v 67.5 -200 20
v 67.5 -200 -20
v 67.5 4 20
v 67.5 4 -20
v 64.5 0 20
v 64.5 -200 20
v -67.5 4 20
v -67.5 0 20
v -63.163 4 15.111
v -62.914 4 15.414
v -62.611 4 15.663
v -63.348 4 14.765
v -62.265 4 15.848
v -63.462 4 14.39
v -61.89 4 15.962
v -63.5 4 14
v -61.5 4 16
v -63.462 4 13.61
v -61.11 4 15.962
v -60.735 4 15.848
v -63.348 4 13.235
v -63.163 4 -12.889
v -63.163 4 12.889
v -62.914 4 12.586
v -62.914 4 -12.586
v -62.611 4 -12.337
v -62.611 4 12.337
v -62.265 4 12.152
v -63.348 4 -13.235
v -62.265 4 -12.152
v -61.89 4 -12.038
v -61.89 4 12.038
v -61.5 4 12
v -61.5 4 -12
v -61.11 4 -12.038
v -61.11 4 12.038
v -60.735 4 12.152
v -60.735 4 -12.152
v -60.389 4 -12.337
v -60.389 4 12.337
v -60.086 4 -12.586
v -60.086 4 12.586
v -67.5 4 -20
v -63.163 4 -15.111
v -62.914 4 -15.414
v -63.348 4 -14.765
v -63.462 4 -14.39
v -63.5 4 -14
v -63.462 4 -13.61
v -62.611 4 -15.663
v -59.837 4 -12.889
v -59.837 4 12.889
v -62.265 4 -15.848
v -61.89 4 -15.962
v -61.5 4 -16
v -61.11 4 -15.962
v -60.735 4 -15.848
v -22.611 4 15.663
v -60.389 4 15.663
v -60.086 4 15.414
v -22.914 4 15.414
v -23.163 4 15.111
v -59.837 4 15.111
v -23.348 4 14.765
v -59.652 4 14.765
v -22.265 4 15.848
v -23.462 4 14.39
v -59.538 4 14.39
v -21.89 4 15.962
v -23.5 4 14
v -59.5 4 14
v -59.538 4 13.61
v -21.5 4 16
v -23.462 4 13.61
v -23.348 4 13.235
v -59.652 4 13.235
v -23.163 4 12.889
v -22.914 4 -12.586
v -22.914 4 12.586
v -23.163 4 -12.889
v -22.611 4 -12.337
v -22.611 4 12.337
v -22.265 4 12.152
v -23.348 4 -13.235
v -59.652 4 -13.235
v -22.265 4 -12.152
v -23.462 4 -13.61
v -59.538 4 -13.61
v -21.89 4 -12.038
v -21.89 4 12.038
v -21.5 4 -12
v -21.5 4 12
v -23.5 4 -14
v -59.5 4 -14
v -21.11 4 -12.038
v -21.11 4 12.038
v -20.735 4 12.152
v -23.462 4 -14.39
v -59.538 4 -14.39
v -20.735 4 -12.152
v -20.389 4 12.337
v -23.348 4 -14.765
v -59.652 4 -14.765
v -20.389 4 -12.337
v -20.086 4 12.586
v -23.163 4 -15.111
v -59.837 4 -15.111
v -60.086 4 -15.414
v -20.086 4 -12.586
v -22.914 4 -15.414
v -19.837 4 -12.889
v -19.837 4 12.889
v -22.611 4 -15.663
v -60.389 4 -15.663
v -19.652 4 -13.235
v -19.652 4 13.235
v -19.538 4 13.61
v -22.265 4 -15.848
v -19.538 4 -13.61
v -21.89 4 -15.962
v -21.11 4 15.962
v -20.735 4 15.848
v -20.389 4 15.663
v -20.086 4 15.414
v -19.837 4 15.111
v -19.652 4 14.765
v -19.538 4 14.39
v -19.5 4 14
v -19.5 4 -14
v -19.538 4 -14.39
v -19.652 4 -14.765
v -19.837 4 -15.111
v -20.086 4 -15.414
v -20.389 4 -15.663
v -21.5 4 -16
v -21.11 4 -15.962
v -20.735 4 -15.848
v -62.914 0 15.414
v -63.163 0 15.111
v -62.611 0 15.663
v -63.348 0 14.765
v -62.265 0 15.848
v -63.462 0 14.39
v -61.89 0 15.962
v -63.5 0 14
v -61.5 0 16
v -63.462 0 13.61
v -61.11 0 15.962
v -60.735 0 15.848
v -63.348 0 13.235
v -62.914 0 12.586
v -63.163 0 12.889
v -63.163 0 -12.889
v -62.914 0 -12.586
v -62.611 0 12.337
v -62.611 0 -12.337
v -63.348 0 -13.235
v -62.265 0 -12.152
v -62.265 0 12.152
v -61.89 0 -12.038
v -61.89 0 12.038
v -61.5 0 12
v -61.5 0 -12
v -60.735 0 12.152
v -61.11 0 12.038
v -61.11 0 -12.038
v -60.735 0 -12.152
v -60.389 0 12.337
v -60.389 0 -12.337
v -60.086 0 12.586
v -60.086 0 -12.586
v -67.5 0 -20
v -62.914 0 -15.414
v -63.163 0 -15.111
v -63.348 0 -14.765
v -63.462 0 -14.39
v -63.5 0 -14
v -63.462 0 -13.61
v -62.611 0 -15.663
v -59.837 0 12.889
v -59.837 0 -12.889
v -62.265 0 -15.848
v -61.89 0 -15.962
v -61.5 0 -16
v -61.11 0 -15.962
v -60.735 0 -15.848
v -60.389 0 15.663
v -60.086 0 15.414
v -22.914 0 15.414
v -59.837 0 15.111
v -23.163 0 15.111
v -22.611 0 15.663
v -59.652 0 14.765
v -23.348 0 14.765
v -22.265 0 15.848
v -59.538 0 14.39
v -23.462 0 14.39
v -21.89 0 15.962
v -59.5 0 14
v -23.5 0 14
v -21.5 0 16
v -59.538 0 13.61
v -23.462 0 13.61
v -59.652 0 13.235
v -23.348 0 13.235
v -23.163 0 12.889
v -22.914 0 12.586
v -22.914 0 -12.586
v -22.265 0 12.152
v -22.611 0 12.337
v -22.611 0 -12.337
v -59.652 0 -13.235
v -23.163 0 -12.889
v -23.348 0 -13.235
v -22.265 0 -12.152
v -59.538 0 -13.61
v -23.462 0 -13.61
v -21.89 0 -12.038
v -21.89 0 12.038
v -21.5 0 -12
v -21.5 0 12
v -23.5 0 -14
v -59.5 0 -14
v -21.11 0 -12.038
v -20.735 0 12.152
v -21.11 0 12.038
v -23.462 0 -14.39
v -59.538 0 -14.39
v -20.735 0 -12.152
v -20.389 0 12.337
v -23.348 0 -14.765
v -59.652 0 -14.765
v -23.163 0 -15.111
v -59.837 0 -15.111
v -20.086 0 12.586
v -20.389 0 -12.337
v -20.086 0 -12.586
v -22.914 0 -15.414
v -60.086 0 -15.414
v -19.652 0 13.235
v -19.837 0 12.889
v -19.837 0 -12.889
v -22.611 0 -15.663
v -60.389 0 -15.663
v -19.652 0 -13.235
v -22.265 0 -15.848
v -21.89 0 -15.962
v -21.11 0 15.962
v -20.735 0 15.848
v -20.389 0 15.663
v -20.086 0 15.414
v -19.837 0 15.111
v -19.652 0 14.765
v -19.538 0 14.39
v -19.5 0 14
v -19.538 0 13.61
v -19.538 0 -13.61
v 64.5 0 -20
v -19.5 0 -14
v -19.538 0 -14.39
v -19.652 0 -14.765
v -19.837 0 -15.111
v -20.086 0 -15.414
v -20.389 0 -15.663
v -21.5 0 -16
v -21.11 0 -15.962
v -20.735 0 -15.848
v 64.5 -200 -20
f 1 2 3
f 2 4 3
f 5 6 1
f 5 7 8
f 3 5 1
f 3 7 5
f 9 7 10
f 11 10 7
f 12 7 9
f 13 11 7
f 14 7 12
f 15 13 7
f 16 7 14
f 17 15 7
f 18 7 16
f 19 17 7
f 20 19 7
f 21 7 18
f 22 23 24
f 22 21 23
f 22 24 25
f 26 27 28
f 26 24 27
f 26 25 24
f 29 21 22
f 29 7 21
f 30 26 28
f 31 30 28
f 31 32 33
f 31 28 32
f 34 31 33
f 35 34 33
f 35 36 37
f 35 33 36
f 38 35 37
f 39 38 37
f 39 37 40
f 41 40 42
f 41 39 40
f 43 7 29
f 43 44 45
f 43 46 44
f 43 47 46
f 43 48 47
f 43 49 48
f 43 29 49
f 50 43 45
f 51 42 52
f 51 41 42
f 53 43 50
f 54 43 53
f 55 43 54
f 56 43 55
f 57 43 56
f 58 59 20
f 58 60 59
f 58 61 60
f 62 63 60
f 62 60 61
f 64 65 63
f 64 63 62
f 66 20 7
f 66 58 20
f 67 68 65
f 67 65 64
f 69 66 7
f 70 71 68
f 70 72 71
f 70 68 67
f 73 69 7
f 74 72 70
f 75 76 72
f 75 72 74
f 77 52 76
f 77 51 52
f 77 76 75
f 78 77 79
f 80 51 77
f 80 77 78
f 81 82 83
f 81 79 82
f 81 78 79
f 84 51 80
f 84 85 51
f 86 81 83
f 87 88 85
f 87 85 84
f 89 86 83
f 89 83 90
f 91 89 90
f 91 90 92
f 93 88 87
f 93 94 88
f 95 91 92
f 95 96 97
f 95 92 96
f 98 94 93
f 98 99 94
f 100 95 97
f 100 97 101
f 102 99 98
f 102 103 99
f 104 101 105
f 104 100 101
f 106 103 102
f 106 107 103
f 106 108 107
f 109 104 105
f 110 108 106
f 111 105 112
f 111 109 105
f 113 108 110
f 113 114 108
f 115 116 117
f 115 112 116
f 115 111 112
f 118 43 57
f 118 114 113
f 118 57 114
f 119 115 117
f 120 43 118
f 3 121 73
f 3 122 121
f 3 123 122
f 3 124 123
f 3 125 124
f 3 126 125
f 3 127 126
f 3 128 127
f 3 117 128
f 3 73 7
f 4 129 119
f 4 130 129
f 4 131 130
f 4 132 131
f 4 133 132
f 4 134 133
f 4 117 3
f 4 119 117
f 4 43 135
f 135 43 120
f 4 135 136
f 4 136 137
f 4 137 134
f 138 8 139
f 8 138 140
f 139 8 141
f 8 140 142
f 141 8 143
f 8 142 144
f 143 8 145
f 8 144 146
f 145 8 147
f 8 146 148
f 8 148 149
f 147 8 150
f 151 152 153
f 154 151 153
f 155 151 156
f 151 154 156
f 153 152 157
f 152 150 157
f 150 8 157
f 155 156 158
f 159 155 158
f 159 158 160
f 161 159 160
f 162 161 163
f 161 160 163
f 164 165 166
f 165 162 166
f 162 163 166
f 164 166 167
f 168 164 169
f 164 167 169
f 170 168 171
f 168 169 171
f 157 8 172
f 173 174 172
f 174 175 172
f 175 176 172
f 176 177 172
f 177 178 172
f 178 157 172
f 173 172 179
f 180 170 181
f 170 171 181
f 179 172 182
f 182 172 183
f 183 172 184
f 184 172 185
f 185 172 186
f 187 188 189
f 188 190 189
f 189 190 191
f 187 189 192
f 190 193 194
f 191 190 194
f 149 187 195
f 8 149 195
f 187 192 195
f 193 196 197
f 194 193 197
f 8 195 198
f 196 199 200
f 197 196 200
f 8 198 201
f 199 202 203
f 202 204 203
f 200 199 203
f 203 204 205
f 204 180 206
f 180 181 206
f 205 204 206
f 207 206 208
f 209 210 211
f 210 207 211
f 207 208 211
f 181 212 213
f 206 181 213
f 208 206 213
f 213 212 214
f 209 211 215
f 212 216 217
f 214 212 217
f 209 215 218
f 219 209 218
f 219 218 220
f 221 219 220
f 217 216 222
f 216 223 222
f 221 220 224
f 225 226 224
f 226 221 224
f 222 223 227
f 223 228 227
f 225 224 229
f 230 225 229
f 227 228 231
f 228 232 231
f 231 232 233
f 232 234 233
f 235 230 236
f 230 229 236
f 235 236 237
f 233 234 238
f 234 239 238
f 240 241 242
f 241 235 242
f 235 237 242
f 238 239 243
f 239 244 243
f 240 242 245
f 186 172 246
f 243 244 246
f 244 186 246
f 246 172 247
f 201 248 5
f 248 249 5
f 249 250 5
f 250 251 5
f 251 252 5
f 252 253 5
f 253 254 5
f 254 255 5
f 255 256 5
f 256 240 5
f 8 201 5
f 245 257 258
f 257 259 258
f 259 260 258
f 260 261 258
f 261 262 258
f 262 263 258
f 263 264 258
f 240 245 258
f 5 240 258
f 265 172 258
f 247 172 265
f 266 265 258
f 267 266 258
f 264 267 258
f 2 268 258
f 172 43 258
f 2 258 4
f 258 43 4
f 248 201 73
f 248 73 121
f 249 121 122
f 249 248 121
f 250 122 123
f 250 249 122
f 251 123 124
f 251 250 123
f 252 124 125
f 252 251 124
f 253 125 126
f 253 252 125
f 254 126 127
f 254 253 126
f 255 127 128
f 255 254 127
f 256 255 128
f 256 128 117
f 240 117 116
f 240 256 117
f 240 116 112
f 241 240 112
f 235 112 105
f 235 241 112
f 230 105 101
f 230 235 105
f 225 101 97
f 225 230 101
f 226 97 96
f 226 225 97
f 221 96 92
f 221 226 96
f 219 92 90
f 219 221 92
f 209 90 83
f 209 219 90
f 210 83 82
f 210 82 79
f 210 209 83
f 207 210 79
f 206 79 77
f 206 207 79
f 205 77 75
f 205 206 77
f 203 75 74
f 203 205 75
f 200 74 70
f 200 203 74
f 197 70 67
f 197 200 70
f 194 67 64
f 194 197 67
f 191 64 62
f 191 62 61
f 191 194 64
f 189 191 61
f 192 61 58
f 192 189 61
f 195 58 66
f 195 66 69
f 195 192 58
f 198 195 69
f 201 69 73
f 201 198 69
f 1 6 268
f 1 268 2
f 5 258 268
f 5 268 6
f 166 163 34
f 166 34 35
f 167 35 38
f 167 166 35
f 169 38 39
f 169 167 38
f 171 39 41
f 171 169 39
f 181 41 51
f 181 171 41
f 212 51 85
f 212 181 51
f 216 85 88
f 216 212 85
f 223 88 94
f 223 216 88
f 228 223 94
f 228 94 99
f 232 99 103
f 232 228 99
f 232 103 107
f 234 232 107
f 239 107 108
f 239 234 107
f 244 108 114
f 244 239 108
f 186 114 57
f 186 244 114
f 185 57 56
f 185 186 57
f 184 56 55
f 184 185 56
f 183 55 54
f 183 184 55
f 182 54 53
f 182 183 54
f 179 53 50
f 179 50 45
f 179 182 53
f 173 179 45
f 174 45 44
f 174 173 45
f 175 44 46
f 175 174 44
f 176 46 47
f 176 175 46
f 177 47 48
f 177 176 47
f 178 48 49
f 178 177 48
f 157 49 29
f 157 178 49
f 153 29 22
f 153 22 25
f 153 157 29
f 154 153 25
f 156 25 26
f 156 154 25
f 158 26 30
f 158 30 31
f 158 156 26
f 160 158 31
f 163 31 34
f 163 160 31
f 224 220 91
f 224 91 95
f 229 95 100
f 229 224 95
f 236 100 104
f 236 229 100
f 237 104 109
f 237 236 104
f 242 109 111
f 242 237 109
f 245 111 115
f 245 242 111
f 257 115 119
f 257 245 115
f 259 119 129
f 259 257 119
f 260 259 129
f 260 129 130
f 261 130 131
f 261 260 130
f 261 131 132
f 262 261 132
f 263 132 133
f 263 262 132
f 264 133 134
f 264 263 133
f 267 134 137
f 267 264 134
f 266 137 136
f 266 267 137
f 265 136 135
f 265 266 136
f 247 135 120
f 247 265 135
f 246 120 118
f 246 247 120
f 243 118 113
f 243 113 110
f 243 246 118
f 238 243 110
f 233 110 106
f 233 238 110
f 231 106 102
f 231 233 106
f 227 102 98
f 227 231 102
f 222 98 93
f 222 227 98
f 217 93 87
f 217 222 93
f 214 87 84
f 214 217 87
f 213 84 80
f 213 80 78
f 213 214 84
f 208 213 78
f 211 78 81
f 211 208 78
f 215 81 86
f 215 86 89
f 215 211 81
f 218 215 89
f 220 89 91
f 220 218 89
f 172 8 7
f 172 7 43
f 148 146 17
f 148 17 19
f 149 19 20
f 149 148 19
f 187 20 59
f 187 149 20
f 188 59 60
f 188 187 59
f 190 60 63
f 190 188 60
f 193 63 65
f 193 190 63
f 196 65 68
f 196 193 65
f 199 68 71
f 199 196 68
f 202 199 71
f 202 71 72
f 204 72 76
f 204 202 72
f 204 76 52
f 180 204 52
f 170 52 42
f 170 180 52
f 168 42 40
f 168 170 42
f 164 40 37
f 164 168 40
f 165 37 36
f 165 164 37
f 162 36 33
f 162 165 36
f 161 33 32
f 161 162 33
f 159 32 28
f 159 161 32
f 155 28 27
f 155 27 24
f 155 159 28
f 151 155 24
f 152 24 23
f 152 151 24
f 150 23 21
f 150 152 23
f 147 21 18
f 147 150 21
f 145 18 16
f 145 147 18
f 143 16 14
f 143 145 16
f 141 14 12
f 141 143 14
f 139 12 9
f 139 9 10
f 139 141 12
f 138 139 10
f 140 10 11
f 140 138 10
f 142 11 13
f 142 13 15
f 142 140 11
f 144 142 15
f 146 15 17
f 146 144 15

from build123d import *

# Parameters (mm, degrees)
SKETCH1_W           = 135
SKETCH1_H           = 40
SKETCH1_R           = 2
BOSS_EXTRUDE1_DEPTH = 4
SKETCH3_W           = 3
SKETCH3_H           = 40
BOSS_EXTRUDE3_DEPTH = 200


with BuildPart() as part:
    # Sketch1 → Boss-Extrude1 (new body)
    with BuildSketch(Plane(origin=(0, 0, 0), x_dir=(1, 0, 0), z_dir=(0, 1, 0))):
        Rectangle(SKETCH1_W, SKETCH1_H)
        with Locations(Location((-21.5, 14, 0), (0, 0, 270))):
            Circle(SKETCH1_R, mode=Mode.SUBTRACT)
        with Locations(Location((-21.5, -14, 0), (0, 0, 270))):
            Circle(SKETCH1_R, mode=Mode.SUBTRACT)
        with Locations(Location((-61.5, -14, 0), (0, 0, 270))):
            Circle(SKETCH1_R, mode=Mode.SUBTRACT)
        with Locations(Location((-61.5, 14, 0), (0, 0, 270))):
            Circle(SKETCH1_R, mode=Mode.SUBTRACT)
    extrude(amount=BOSS_EXTRUDE1_DEPTH)

    # Sketch3 → Boss-Extrude3 (add)
    with BuildSketch(Plane.XZ):
        with Locations((66, 0)):
            Rectangle(SKETCH3_W, SKETCH3_H)
    extrude(amount=BOSS_EXTRUDE3_DEPTH)


solid = part.part
